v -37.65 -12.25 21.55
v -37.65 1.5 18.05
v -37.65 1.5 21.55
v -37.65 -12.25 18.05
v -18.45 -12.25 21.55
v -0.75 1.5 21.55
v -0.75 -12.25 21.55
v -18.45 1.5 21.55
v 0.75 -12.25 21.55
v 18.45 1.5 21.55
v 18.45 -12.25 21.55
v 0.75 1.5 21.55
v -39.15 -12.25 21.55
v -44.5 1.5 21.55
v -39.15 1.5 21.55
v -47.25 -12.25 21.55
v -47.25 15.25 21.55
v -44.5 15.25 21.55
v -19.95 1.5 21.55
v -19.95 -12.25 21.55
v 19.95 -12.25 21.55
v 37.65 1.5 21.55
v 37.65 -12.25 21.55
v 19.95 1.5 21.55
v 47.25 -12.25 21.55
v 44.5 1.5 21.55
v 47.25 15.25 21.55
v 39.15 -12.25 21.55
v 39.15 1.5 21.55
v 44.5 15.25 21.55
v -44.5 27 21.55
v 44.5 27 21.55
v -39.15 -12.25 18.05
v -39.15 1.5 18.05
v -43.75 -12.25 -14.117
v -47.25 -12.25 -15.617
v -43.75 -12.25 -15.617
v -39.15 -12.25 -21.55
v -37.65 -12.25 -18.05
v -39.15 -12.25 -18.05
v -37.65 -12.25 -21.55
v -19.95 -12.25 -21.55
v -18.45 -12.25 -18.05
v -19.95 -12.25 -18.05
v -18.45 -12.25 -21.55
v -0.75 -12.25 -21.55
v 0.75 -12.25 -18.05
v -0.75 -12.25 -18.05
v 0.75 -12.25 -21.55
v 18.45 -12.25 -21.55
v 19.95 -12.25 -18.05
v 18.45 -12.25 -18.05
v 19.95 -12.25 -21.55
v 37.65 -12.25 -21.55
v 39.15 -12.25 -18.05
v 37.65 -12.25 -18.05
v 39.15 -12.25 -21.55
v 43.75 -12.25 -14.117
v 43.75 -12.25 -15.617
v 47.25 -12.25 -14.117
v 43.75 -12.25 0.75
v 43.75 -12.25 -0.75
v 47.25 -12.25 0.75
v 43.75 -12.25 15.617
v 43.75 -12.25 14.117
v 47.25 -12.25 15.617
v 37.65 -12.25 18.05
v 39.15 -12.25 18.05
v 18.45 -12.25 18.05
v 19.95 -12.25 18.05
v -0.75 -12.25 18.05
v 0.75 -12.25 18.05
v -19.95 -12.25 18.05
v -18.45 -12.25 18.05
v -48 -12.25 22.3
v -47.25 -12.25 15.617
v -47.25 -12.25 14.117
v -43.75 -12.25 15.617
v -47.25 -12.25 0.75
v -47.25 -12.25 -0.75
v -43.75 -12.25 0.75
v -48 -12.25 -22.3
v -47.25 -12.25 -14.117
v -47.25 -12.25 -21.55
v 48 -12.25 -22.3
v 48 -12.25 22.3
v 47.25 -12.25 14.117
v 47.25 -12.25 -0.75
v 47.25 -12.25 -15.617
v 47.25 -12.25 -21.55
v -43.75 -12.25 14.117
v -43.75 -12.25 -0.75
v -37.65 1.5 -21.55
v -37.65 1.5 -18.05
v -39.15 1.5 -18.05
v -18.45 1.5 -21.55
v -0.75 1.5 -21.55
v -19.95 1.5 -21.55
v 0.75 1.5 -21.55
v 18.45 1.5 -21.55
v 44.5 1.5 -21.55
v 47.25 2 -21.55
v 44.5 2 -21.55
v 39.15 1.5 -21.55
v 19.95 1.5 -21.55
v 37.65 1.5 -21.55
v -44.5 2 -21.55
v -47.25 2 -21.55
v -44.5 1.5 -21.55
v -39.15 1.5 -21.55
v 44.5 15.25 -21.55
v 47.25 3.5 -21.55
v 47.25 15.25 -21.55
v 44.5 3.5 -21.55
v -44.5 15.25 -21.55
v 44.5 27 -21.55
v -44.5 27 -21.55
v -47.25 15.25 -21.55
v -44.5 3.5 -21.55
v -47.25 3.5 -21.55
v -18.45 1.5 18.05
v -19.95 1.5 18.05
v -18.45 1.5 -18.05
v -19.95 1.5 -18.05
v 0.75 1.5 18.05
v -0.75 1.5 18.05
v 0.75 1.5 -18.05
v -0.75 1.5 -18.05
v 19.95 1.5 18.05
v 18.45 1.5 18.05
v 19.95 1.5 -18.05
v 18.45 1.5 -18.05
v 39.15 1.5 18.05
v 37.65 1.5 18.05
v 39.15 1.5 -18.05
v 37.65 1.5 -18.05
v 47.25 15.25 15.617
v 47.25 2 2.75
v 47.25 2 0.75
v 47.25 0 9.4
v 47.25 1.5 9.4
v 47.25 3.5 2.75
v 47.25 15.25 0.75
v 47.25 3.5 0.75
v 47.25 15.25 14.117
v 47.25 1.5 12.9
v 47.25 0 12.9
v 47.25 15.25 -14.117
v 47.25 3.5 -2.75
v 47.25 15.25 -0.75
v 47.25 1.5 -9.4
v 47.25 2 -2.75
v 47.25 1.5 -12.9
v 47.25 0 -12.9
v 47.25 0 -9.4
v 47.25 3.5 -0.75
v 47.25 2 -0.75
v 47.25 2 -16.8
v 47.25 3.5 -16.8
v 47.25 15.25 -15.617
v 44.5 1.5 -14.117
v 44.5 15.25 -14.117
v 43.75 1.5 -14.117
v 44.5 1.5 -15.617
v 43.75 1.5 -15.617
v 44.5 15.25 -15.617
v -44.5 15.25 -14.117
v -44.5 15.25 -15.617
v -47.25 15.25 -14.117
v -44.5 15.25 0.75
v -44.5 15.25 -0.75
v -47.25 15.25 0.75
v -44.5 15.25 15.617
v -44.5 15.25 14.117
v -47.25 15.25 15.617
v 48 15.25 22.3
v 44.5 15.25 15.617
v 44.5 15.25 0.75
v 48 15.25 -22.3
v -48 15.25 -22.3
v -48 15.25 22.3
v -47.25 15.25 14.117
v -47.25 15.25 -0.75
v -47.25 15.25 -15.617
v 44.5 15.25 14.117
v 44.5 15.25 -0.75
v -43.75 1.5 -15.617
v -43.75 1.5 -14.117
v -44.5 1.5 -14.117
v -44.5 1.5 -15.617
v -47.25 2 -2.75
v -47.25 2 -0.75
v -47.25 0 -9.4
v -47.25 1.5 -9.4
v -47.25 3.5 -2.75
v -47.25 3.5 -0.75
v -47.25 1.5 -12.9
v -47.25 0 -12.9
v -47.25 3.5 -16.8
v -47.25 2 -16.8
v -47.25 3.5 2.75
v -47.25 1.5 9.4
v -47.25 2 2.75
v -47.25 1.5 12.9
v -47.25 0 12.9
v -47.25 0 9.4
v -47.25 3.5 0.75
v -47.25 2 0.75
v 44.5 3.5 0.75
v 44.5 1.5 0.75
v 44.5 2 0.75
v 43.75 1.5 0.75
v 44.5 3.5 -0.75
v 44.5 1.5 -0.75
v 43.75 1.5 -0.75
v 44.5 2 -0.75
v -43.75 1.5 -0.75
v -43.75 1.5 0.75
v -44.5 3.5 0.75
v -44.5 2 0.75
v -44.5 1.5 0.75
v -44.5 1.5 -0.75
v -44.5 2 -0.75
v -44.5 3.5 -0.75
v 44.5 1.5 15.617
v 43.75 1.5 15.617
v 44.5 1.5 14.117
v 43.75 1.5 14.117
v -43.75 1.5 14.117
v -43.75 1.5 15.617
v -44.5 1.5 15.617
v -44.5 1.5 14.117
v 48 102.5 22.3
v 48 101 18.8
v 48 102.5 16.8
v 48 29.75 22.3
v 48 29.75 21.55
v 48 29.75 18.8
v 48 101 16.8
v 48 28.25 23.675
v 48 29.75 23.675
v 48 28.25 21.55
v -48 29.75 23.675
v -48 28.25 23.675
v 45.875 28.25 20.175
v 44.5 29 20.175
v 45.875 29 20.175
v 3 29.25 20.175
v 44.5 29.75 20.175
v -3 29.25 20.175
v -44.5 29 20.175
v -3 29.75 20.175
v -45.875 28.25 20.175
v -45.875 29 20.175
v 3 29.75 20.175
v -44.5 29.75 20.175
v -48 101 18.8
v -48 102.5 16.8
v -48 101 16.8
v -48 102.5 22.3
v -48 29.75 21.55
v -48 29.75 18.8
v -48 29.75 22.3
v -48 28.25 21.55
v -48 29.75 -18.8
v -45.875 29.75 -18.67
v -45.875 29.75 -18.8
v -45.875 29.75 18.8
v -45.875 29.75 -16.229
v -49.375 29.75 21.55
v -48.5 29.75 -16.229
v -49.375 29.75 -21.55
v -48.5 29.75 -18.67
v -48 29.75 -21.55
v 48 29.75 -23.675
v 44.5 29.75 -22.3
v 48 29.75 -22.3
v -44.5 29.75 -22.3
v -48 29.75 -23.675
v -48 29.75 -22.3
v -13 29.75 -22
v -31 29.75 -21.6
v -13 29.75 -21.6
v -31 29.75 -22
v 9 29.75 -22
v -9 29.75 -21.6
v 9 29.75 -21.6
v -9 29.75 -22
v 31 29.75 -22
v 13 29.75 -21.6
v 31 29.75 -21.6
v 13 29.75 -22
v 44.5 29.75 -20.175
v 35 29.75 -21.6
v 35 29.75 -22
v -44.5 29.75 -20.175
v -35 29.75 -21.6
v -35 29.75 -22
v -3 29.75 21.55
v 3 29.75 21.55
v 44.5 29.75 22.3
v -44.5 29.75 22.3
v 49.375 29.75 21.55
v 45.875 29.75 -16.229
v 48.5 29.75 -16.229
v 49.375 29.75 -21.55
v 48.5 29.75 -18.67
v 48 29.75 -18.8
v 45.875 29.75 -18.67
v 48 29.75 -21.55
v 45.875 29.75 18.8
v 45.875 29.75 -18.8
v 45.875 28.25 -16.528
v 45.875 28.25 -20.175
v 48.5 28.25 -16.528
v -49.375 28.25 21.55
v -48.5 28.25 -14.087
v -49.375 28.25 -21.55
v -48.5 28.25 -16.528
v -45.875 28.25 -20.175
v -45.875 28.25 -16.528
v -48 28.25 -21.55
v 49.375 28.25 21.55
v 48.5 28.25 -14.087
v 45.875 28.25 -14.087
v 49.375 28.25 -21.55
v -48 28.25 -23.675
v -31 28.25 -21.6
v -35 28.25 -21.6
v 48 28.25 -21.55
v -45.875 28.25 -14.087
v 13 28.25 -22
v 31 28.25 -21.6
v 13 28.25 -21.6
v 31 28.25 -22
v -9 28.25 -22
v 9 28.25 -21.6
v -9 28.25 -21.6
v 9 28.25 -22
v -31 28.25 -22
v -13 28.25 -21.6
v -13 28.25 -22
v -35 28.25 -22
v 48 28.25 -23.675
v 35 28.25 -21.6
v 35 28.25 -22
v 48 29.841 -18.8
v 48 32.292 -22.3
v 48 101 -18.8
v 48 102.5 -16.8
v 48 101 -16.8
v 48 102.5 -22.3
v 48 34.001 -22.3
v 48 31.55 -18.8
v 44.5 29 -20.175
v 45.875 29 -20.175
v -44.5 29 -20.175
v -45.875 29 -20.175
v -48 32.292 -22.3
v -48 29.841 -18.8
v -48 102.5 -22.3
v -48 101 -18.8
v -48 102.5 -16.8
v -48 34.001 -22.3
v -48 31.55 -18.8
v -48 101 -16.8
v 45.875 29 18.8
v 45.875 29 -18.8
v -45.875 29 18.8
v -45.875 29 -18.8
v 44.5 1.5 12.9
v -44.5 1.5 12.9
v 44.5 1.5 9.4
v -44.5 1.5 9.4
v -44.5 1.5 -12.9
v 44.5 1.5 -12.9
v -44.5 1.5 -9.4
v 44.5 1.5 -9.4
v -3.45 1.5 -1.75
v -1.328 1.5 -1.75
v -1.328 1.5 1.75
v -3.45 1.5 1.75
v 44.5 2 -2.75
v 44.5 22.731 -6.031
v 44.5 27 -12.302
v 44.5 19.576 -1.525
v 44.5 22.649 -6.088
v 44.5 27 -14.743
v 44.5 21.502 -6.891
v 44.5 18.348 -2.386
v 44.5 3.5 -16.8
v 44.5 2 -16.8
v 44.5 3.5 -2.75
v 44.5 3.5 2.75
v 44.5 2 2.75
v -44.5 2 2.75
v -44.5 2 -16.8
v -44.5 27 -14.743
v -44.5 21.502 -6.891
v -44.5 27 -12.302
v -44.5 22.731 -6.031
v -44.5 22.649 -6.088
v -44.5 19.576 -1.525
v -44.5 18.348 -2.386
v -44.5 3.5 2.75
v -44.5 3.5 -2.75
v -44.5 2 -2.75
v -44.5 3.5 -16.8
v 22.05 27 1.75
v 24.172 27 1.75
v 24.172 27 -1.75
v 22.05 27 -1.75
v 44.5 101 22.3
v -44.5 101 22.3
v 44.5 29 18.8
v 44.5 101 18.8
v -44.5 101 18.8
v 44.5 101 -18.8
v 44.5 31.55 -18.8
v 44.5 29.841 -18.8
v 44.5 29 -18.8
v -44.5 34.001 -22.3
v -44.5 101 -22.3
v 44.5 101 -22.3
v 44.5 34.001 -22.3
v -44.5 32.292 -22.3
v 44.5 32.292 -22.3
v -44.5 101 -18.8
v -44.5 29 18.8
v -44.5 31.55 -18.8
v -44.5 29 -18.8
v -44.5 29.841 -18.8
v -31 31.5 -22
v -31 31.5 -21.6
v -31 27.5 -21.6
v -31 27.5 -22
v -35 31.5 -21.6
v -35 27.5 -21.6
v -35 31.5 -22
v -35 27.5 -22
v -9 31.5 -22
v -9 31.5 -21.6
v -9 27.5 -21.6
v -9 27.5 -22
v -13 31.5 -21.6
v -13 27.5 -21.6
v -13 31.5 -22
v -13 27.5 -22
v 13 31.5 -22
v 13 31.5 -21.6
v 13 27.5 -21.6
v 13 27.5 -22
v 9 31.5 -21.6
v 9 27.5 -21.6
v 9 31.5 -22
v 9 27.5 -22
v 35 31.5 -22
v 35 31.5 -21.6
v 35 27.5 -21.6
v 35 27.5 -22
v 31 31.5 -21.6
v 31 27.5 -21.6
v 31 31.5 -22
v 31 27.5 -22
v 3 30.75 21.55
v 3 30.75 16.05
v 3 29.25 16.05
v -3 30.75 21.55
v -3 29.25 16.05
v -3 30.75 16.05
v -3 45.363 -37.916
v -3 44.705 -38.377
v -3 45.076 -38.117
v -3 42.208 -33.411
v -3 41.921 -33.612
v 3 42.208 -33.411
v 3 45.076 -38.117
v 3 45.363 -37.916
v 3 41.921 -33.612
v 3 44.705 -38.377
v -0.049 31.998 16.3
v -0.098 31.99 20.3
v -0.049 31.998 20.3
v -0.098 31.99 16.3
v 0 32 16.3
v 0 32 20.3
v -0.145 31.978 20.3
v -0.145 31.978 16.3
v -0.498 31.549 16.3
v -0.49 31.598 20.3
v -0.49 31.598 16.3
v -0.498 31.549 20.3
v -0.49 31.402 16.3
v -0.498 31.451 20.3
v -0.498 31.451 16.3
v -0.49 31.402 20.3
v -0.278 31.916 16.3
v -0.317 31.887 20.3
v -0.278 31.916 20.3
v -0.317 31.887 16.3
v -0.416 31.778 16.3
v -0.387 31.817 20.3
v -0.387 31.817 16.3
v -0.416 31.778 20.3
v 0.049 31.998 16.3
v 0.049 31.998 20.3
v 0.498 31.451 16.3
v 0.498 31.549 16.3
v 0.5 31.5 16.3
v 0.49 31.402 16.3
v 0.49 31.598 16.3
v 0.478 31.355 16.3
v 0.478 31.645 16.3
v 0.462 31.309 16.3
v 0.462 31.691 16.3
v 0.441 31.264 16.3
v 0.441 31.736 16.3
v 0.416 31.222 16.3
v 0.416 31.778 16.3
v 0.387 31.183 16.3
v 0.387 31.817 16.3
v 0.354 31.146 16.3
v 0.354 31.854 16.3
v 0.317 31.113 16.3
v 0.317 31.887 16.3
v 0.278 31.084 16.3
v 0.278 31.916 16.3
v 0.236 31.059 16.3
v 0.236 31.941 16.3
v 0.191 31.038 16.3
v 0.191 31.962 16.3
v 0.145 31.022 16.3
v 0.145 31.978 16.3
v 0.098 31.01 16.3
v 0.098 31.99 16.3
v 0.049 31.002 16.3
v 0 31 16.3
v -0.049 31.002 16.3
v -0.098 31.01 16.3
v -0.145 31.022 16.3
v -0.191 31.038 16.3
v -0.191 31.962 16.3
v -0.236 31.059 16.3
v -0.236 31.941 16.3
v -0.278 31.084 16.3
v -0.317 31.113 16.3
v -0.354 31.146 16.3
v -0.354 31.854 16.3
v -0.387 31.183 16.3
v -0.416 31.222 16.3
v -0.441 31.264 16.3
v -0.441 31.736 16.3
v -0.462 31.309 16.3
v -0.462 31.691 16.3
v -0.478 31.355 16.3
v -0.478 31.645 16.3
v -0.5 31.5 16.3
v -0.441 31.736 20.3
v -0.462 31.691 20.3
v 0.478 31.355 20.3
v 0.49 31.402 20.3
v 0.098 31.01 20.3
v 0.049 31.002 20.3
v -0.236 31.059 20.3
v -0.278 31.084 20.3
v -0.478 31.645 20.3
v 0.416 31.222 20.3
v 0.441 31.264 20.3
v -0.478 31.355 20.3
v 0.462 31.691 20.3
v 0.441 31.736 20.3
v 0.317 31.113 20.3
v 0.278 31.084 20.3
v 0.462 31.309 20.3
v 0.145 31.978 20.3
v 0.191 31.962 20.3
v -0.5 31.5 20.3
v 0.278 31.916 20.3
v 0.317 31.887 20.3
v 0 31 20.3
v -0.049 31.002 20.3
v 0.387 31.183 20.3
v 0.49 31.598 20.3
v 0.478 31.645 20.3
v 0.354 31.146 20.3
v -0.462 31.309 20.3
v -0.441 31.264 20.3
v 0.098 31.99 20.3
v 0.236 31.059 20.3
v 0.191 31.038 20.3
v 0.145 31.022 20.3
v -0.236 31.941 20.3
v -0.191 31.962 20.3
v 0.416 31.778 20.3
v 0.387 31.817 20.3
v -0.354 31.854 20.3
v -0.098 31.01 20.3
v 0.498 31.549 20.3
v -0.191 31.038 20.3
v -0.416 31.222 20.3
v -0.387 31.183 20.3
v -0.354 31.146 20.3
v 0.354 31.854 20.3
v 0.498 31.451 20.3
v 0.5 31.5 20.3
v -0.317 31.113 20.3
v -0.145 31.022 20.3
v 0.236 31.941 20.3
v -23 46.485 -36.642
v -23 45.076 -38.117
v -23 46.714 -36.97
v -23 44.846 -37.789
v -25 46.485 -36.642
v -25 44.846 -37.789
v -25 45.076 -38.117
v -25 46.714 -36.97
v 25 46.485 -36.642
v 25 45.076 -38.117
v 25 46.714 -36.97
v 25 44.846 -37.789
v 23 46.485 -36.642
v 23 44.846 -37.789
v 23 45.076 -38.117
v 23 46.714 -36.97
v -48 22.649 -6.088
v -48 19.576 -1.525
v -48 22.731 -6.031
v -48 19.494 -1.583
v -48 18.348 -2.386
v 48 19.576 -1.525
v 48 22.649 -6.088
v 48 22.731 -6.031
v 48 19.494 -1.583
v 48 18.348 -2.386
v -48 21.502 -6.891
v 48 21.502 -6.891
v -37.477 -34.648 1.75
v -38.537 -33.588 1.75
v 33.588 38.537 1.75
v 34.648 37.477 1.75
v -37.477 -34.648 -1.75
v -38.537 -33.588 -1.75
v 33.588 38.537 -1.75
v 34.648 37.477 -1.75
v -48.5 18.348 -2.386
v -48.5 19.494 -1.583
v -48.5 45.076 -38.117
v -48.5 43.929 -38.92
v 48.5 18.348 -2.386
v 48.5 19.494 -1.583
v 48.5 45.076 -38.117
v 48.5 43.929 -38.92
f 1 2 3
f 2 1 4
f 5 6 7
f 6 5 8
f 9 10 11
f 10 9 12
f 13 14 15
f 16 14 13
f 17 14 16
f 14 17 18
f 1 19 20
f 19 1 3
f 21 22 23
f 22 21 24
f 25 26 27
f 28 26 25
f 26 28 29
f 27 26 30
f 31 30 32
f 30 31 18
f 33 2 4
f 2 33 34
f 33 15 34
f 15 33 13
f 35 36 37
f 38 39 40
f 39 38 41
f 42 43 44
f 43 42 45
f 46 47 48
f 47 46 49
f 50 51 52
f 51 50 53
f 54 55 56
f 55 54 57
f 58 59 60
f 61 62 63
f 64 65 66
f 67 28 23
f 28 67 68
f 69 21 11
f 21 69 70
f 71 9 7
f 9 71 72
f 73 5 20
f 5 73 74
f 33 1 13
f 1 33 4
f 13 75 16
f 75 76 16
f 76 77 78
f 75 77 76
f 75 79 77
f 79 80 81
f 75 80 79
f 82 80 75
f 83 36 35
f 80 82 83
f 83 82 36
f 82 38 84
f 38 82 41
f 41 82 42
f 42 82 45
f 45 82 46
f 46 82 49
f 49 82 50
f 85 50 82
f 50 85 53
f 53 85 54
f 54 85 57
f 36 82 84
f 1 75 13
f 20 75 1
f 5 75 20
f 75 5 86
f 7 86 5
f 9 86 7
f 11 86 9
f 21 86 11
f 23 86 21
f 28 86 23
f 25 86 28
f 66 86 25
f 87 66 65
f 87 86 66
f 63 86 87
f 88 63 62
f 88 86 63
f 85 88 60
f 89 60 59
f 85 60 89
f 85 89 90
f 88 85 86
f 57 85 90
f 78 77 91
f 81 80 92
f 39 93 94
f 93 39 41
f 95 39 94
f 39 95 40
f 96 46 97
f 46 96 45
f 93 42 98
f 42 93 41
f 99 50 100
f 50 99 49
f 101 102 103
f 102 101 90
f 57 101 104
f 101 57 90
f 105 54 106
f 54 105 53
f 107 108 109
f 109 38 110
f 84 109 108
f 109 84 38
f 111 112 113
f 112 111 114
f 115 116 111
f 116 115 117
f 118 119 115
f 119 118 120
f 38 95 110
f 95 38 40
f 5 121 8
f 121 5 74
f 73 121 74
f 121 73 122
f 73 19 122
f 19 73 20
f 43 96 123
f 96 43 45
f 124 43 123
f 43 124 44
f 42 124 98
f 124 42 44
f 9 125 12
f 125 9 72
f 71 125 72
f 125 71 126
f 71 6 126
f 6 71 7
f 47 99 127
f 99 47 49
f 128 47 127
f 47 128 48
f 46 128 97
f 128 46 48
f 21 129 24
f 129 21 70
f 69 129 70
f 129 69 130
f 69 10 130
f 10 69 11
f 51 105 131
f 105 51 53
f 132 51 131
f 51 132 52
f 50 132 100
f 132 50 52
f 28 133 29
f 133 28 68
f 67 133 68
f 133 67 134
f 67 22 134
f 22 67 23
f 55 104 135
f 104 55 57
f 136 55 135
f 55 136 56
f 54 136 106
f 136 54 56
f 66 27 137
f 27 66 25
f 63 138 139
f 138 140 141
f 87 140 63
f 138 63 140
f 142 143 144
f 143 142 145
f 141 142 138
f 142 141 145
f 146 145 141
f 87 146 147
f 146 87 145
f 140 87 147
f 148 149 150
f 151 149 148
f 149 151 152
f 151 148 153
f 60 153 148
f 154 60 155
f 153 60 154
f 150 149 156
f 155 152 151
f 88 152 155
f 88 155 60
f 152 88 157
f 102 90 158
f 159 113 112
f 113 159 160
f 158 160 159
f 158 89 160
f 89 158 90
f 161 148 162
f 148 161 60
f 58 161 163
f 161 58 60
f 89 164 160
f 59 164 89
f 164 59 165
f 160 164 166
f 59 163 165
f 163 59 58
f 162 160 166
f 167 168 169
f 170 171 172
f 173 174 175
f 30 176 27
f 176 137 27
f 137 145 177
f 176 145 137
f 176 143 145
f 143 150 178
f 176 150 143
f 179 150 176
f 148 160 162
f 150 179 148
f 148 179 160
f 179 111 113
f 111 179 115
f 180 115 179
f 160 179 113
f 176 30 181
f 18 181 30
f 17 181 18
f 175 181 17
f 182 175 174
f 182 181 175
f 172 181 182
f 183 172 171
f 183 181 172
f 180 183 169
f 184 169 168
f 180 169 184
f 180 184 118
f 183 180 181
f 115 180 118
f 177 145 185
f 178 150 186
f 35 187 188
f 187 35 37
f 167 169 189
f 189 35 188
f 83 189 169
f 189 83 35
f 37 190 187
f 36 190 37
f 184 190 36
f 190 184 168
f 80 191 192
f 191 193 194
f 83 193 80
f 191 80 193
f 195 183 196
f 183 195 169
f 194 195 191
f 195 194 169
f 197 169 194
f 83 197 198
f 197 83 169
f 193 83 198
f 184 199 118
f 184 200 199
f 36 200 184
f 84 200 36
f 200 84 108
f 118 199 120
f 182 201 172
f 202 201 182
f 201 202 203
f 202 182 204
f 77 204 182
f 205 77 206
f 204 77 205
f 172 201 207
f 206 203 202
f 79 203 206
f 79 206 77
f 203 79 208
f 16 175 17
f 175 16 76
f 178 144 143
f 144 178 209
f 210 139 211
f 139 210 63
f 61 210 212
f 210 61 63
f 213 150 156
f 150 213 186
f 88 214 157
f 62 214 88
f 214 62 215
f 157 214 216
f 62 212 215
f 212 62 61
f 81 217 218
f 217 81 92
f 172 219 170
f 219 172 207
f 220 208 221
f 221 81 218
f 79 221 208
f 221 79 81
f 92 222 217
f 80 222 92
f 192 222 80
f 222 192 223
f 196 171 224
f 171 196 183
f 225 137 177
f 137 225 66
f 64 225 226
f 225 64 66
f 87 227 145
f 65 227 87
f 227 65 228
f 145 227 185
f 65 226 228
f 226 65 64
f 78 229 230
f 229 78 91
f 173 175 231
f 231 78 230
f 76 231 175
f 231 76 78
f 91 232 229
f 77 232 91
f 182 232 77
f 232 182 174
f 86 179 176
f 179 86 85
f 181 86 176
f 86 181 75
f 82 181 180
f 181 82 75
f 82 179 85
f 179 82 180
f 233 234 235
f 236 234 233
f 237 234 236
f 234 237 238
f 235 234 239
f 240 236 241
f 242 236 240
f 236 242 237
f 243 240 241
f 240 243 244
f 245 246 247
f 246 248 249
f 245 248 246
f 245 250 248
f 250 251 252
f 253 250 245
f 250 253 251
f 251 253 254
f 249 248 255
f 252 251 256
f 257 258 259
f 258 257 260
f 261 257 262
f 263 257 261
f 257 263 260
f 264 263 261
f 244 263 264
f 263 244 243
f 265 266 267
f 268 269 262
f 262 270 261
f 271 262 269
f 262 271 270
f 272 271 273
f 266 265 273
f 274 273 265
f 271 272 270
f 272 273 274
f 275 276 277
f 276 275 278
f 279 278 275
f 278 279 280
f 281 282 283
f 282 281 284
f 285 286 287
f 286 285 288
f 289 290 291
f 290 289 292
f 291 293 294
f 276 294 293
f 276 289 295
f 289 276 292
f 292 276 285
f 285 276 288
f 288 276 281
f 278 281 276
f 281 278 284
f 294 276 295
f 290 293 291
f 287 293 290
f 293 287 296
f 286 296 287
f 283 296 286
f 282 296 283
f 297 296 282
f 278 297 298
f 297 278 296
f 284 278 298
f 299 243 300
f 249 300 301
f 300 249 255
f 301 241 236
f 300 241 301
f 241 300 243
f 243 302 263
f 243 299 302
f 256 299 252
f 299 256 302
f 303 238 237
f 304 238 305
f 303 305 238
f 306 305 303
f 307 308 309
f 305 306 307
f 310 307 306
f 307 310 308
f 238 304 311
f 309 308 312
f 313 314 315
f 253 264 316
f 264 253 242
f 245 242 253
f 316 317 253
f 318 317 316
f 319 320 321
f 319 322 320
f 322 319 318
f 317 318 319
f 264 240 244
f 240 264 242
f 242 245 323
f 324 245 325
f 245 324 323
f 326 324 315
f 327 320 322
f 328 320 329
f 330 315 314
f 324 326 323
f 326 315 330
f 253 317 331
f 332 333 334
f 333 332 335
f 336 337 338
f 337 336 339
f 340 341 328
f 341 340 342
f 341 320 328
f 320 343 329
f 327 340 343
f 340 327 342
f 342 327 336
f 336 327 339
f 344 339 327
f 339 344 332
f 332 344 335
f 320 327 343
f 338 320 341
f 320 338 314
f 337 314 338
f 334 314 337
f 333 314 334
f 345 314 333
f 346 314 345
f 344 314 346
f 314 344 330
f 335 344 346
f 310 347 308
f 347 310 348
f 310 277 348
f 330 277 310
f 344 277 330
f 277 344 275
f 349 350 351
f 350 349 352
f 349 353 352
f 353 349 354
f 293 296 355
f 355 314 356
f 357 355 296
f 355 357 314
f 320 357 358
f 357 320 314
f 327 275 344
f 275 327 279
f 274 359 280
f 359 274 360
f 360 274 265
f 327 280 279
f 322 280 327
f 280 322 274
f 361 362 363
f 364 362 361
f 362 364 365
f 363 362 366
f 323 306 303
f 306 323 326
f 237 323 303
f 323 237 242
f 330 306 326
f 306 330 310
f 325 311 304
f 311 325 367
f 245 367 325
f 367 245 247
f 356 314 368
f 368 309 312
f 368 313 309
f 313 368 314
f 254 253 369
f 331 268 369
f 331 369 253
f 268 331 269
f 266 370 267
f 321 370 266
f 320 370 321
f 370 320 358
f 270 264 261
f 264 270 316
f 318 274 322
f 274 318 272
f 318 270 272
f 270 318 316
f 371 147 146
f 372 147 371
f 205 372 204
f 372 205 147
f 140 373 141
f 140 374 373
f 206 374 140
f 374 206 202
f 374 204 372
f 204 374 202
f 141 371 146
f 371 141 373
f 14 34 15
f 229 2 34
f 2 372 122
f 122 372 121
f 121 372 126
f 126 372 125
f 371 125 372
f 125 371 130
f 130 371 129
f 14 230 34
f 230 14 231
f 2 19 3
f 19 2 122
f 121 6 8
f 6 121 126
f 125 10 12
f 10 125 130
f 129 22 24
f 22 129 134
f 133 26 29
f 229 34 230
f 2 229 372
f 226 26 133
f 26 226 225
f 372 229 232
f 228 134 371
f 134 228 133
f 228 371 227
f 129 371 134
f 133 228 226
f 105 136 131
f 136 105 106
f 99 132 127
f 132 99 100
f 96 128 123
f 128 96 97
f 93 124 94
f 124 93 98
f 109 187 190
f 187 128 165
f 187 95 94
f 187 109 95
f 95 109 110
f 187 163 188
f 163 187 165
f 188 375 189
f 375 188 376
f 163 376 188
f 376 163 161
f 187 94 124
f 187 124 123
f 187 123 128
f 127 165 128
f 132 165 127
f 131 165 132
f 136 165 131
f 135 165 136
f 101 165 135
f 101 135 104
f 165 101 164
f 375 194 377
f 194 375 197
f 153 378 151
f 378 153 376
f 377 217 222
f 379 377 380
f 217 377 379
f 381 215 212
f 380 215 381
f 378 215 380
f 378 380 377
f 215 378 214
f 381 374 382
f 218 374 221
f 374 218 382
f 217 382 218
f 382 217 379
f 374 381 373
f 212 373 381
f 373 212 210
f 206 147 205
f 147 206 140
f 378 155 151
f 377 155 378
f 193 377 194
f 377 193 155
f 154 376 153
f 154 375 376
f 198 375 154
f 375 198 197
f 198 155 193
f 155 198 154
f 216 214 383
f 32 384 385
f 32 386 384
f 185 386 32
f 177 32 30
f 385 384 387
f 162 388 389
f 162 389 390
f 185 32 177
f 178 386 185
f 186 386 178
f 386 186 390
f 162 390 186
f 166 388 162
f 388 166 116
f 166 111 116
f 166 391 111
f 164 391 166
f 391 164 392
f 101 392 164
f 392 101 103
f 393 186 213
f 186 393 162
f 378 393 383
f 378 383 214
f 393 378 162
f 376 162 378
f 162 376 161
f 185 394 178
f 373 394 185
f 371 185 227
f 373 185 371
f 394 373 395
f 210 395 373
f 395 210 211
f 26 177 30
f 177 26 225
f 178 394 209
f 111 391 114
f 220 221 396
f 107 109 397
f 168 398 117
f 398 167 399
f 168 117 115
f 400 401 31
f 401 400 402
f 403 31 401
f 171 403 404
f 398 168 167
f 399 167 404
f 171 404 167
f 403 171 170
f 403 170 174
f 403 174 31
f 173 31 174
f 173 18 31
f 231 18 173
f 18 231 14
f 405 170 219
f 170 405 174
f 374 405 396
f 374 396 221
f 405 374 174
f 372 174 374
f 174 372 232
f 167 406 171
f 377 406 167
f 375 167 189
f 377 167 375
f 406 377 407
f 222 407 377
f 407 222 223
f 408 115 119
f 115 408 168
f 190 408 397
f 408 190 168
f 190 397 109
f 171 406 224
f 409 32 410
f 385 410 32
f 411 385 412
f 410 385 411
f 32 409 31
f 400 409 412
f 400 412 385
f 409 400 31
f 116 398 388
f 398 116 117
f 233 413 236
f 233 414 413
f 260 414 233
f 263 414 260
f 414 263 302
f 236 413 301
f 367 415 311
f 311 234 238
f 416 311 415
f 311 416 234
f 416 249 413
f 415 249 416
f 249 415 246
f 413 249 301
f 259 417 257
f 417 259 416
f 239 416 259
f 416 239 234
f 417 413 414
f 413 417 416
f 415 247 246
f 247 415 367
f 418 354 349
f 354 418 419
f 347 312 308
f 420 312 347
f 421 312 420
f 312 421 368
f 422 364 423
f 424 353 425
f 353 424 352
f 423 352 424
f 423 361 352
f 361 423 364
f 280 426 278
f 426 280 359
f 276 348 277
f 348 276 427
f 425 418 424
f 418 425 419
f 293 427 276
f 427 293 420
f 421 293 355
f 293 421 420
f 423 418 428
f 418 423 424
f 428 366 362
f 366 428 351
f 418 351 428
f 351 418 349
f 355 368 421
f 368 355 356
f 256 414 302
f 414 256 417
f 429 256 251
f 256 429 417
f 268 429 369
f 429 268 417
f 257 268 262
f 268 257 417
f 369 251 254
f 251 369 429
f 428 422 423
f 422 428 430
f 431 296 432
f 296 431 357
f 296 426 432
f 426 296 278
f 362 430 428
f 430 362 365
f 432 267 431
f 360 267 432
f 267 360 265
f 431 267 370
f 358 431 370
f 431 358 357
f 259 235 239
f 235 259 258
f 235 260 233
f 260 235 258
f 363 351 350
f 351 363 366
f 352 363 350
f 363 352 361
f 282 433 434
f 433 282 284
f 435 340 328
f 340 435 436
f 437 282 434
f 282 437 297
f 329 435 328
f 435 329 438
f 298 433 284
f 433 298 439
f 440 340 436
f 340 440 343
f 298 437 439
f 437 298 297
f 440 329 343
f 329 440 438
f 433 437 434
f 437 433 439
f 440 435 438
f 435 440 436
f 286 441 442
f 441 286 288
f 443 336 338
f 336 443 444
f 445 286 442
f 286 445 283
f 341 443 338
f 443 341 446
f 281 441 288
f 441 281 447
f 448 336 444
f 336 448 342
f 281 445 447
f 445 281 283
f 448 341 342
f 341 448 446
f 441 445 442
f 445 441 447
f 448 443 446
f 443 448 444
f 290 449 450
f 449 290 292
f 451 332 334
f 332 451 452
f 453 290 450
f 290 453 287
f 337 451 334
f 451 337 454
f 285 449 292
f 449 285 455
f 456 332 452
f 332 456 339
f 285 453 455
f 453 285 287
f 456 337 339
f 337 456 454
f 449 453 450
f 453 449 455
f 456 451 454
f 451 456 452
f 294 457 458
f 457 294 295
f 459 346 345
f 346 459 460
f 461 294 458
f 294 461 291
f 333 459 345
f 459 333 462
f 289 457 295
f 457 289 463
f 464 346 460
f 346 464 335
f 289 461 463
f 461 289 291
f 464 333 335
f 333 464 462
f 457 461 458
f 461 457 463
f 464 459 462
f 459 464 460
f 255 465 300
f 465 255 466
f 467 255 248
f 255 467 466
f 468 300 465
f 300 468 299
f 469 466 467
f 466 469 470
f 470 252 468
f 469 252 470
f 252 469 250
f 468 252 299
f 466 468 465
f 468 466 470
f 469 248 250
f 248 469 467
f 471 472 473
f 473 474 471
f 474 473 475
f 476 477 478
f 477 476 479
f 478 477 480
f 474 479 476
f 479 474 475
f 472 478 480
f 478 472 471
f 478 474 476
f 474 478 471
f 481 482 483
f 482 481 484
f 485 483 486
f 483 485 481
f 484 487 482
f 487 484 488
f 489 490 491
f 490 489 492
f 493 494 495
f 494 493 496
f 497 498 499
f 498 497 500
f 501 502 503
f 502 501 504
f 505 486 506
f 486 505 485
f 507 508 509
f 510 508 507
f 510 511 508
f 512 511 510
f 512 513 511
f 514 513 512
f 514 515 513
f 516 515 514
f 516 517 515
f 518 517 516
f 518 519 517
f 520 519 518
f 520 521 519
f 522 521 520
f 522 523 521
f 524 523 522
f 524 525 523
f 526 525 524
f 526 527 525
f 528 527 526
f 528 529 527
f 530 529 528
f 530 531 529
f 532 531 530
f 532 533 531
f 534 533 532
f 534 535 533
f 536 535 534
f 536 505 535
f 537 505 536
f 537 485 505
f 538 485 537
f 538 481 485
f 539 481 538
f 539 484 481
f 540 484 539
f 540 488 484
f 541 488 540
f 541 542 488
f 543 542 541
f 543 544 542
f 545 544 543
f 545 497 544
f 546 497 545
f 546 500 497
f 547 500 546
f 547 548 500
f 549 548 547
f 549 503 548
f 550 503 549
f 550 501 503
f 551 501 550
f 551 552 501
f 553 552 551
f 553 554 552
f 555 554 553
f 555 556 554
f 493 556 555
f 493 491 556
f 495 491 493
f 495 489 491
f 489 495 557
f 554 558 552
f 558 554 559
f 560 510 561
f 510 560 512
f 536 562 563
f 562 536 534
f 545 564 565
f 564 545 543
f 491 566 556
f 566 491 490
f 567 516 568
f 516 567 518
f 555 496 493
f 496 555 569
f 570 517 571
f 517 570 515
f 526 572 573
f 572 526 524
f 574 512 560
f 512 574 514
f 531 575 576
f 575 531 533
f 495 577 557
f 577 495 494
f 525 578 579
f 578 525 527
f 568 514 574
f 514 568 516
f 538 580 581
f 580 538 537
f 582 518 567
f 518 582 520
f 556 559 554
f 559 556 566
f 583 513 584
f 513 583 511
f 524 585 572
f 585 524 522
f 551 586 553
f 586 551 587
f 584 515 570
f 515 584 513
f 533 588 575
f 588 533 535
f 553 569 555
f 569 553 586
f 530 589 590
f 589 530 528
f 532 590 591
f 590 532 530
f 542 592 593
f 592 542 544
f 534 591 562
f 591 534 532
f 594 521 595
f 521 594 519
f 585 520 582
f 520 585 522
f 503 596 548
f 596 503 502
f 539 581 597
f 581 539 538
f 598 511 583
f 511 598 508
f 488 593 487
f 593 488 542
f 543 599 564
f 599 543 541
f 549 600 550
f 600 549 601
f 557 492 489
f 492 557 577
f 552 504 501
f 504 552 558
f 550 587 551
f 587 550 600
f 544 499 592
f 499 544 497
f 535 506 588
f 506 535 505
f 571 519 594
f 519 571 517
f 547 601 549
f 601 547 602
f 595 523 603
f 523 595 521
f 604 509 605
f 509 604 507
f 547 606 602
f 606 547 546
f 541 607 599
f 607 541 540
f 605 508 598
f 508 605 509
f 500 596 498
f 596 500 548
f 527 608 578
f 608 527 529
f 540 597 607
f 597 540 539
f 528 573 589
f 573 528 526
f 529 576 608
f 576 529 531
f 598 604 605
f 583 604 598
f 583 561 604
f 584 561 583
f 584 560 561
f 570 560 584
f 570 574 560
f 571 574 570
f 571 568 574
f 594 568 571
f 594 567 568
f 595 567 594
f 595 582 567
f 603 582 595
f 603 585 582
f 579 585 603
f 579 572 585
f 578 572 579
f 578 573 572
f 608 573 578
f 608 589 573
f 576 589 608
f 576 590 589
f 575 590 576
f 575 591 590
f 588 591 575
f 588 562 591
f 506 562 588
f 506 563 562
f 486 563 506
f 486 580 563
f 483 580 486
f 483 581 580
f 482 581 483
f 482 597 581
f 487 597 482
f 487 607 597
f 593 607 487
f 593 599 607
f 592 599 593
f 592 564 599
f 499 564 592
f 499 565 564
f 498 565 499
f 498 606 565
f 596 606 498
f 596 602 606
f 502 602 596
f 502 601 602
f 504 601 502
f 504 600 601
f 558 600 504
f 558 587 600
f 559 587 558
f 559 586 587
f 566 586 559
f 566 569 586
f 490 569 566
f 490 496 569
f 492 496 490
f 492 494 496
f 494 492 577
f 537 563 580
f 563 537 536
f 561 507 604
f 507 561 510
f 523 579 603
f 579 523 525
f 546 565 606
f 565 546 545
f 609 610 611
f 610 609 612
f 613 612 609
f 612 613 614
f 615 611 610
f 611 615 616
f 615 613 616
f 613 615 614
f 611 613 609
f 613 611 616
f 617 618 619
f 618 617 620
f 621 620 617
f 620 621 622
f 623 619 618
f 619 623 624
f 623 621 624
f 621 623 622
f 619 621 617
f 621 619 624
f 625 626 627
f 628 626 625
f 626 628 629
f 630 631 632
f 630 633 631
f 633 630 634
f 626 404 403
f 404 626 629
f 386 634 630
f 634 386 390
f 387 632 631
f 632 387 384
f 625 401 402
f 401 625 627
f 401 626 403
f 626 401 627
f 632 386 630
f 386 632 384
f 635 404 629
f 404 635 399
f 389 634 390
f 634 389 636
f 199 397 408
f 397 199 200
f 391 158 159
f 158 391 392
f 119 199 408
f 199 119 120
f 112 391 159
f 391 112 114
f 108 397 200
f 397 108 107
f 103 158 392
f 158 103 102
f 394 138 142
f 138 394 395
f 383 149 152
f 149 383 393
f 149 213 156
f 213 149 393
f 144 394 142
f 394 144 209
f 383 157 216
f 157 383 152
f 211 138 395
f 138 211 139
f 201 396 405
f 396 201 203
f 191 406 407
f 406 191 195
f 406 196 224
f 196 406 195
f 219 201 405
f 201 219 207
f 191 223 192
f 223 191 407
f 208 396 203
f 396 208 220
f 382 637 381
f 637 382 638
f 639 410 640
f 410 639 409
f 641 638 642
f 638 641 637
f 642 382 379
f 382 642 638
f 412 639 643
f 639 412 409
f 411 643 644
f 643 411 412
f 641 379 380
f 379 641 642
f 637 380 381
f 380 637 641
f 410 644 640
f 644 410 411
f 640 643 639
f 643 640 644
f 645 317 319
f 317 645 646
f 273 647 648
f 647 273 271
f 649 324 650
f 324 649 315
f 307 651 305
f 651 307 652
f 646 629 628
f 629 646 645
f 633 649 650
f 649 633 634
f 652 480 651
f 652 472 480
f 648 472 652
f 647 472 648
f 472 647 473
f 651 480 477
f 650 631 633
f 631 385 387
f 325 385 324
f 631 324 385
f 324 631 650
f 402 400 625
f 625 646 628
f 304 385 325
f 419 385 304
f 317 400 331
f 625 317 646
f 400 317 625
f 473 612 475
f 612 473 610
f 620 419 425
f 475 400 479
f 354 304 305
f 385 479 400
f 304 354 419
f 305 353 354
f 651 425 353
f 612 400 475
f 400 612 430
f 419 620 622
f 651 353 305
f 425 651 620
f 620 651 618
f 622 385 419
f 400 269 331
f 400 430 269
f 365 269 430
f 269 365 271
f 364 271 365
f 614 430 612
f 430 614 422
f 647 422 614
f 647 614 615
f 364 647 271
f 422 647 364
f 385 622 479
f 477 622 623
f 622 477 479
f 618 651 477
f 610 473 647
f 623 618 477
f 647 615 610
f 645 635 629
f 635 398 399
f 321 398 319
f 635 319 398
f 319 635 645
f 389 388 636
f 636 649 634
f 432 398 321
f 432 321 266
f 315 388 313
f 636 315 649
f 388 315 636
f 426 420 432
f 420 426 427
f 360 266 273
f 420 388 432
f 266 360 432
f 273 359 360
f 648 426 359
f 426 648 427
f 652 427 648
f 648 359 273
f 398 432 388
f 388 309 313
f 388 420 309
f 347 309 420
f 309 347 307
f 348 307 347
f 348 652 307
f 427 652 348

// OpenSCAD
// file: ../wattplot_params.scad
// =============================================================================
// wattplot_params.scad -- mirror of wattplot_params.py
// =============================================================================
//
// DO NOT EDIT THESE NUMBERS WITHOUT UPDATING wattplot_params.py AND
// firmware/tests/test_openscad_params.py.
//
// The Python source of truth is wattplot_params.py at the repo root.
// This file is a hand-maintained mirror so the OpenSCAD models can
// render without Python. A CI test (test_openscad_params.py) reads
// both and fails if any number has drifted.
//
// If you change a value here, change it in wattplot_params.py first
// and update the test expectations in test_openscad_params.py. The
// commit message should reference the param name (e.g.
// "scad: bump POSTS.height_in to 78 for v3.1 storm margin").
//
// All dimensions are in inches. OpenSCAD's $fn controls mesh
// resolution -- 64 gives a clean STL that's about 2 MB at this
// model's complexity.

// ---------- LOCATION ----------
location_latitude  = 33.45;     // Phoenix, AZ
location_longitude = -112.07;
location_elevation_m = 337;
location_design_wind_mph = 115.0; // ASCE 7-22, Risk Cat II 700-yr

// ---------- PLANTER LIMITS ----------
max_planter_L_in = 96.0;          // 8 ft stock, no waste on long rails
max_planter_W_in = 60.0;          // 5 ft (8 ft cross-cut, 2 cross-rails per board)

// ---------- BED (planter, ballasted) ----------
bed_outer_L_in       = 96.0;       // 8 ft (capped at max_planter_L_in)
bed_outer_W_in       = 44.6;       // matches panel width
bed_wall_thk_in      = 0.75;       // 1x6 cedar (3/4" actual)
bed_wall_h_in        = 27.5;       // 5 courses of 1x6 (5.5" actual)
                                   //   wind-sized: SF_overturning 2.55 at 35°
bed_soil_fill_in     = 25.5;       // 2" freeboard below the rim
                                   //   ~60 cu ft = 2.2 cu yd = ~4,000 lb
bed_skid_h_in        = 1.5;        // walls rest on 2x4 footers
bed_skid_side_in     = 3.5;        // 4x nominal

// ---------- BED WALL (1x6 cedar skin over 2x4 cleats) ----------
wall_skin_thk_in   = 0.75;
wall_course_h_in   = 5.5;
wall_courses       = 5;            // 5 x 5.5" = 27.5" wall
wall_cleat_thk_in  = 1.5;          // 2x4 actual
wall_cleat_wid_in  = 3.5;          // 2x4 actual
wall_cleats_long   = 5;            // per long wall
wall_cleats_short  = 3;            // per short wall
wall_header_thk_in = 1.5;         // 2x4 on wide face
wall_header_wid_in = 3.5;

// ---------- POSTS (4x4 PT, 72" tall, walk-under canopy) ----------
post_thk_in  = 3.5;               // 4x4 actual
post_height_in = 72.0;            // 6 ft -- walk-under / reach-under
post_count   = 4;
post_rail_thk_in = 1.5;          // 2x6 on post tops
post_rail_wid_in = 5.5;

// ---------- PANEL (LONGi Hi-MO X10 620W default) ----------
panel_L_in        = 97.0;         // 8.08 ft (overhangs bed 0.5"/side)
panel_W_in        = 44.6;         // 3.72 ft
panel_thk_in      = 1.4;
panel_mass_lb     = 65.0;
panel_wattage     = 620;
panel_tilt_deg    = 35.0;         // 0 = flat, 35 = max (wind-limited)

// ---------- CONTROL (tilt cap + PI setpoint) ----------
control_max_tilt_deg  = 35.0;     // STRUCTURAL cap. See ADR-001.
control_target_current_A = 0.5;
control_hard_current_limit_A = 2.5;

// ---------- FRAME (perimeter around the panel) ----------
frame_long_rail_thk_in   = 1.5;    // 2x6 actual
frame_long_rail_wid_in   = 5.5;
frame_long_rail_length_in = 96.0;  // 8 ft stock, no waste

frame_cross_rail_thk_in   = 1.5;   // 2x6 actual
frame_cross_rail_wid_in   = 5.5;
frame_cross_rail_length_in = 42.0; // 2x6x8ft cut to 42"

frame_brace_thk_in   = 1.5;         // 2x4 actual
frame_brace_wid_in   = 3.5;
frame_brace_length_in = 102.0;     // 2x4x10ft cut to 102"

// ---------- HINGES + PANEL CLAMPS ----------
hinge_leaf_in    = 4.0;            // 4"x4" leaf, 1/2" pin
hinge_pin_d_in    = 0.5;
hinge_count      = 4;
hinge_spacing_in = 22.0;           // 22" o.c.
hinge_rod_length_in = 72.0;        // 1/2" x 72" steel rod (HD)

panel_clamp_length_in = 2.0;       // IronRidge mid-clamp, 35mm channel
panel_clamp_height_in = 2.0;
panel_clamp_thk_in   = 0.4;
panel_clamps_per_long_rail  = 2;
panel_clamps_per_cross_rail = 1;

// ---------- ACTUATOR MOUNT ----------
actuator_block_thk_in  = 1.5;      // 2x6 actual
actuator_block_wid_in  = 5.5;
actuator_block_length_in = 6.0;
actuator_stroke_in     = 4.0;       // 12V linear actuator
actuator_width_in      = 2.0;       // body width (for clearance check)
actuator_height_in     = 2.5;

// ---------- DERIVED (don't change) ----------
// Bed is sized so the panel overhangs the rails by 0.5" per side.
// The panel mid-clamps grip the aluminum frame, not the glass.
bed_inner_L_in = bed_outer_L_in - 2 * post_thk_in;
bed_inner_W_in = bed_outer_W_in - 2 * wall_skin_thk_in;
// Wall sits on top of skid; rim = wall + skid.
bed_rim_h_in = bed_wall_h_in + bed_skid_h_in;
// Panel frame offset above the bed rail (clearance for the clamp).
panel_clearance_in = 2.0;         // 2" above the rail top

// Render resolution: $fn controls segment count for curves.
// 64 gives a clean STL ~2 MB. Lower for fast preview, higher for
// 3D printing.
$fn = 64;
// main file
// presets/longi_620W.scad -- LONGi Hi-MO X10 620W bifacial (default preset)
//
// OpenSCAD doesn't have a config-file equivalent, so the preset
// parameters are passed via -D on the command line. This file
// is a one-liner: include the canonical model + the panel dims.
//
// Render:
//   openscad -o wattplot_longi_620W.stl presets/longi_620W.scad
//   or: make scad-stl
//
// The Makefile's per-preset dimension table is the canonical
// source for these numbers -- update BOTH wattplot_params.py AND
// the Makefile when you add a new preset.

include <../wattplot_params.scad>
panel_L_in     = 97.0;
panel_W_in     = 44.6;
panel_wattage  = 620;

use <../wattplot.scad>

if (is_undef($use_only)) {
    $fn = 64;
    bed_assembly();
    posts_assembly();
    hinges_assembly();
    actuator_assembly();
    frame_assembly();
    panel_assembly();
}
